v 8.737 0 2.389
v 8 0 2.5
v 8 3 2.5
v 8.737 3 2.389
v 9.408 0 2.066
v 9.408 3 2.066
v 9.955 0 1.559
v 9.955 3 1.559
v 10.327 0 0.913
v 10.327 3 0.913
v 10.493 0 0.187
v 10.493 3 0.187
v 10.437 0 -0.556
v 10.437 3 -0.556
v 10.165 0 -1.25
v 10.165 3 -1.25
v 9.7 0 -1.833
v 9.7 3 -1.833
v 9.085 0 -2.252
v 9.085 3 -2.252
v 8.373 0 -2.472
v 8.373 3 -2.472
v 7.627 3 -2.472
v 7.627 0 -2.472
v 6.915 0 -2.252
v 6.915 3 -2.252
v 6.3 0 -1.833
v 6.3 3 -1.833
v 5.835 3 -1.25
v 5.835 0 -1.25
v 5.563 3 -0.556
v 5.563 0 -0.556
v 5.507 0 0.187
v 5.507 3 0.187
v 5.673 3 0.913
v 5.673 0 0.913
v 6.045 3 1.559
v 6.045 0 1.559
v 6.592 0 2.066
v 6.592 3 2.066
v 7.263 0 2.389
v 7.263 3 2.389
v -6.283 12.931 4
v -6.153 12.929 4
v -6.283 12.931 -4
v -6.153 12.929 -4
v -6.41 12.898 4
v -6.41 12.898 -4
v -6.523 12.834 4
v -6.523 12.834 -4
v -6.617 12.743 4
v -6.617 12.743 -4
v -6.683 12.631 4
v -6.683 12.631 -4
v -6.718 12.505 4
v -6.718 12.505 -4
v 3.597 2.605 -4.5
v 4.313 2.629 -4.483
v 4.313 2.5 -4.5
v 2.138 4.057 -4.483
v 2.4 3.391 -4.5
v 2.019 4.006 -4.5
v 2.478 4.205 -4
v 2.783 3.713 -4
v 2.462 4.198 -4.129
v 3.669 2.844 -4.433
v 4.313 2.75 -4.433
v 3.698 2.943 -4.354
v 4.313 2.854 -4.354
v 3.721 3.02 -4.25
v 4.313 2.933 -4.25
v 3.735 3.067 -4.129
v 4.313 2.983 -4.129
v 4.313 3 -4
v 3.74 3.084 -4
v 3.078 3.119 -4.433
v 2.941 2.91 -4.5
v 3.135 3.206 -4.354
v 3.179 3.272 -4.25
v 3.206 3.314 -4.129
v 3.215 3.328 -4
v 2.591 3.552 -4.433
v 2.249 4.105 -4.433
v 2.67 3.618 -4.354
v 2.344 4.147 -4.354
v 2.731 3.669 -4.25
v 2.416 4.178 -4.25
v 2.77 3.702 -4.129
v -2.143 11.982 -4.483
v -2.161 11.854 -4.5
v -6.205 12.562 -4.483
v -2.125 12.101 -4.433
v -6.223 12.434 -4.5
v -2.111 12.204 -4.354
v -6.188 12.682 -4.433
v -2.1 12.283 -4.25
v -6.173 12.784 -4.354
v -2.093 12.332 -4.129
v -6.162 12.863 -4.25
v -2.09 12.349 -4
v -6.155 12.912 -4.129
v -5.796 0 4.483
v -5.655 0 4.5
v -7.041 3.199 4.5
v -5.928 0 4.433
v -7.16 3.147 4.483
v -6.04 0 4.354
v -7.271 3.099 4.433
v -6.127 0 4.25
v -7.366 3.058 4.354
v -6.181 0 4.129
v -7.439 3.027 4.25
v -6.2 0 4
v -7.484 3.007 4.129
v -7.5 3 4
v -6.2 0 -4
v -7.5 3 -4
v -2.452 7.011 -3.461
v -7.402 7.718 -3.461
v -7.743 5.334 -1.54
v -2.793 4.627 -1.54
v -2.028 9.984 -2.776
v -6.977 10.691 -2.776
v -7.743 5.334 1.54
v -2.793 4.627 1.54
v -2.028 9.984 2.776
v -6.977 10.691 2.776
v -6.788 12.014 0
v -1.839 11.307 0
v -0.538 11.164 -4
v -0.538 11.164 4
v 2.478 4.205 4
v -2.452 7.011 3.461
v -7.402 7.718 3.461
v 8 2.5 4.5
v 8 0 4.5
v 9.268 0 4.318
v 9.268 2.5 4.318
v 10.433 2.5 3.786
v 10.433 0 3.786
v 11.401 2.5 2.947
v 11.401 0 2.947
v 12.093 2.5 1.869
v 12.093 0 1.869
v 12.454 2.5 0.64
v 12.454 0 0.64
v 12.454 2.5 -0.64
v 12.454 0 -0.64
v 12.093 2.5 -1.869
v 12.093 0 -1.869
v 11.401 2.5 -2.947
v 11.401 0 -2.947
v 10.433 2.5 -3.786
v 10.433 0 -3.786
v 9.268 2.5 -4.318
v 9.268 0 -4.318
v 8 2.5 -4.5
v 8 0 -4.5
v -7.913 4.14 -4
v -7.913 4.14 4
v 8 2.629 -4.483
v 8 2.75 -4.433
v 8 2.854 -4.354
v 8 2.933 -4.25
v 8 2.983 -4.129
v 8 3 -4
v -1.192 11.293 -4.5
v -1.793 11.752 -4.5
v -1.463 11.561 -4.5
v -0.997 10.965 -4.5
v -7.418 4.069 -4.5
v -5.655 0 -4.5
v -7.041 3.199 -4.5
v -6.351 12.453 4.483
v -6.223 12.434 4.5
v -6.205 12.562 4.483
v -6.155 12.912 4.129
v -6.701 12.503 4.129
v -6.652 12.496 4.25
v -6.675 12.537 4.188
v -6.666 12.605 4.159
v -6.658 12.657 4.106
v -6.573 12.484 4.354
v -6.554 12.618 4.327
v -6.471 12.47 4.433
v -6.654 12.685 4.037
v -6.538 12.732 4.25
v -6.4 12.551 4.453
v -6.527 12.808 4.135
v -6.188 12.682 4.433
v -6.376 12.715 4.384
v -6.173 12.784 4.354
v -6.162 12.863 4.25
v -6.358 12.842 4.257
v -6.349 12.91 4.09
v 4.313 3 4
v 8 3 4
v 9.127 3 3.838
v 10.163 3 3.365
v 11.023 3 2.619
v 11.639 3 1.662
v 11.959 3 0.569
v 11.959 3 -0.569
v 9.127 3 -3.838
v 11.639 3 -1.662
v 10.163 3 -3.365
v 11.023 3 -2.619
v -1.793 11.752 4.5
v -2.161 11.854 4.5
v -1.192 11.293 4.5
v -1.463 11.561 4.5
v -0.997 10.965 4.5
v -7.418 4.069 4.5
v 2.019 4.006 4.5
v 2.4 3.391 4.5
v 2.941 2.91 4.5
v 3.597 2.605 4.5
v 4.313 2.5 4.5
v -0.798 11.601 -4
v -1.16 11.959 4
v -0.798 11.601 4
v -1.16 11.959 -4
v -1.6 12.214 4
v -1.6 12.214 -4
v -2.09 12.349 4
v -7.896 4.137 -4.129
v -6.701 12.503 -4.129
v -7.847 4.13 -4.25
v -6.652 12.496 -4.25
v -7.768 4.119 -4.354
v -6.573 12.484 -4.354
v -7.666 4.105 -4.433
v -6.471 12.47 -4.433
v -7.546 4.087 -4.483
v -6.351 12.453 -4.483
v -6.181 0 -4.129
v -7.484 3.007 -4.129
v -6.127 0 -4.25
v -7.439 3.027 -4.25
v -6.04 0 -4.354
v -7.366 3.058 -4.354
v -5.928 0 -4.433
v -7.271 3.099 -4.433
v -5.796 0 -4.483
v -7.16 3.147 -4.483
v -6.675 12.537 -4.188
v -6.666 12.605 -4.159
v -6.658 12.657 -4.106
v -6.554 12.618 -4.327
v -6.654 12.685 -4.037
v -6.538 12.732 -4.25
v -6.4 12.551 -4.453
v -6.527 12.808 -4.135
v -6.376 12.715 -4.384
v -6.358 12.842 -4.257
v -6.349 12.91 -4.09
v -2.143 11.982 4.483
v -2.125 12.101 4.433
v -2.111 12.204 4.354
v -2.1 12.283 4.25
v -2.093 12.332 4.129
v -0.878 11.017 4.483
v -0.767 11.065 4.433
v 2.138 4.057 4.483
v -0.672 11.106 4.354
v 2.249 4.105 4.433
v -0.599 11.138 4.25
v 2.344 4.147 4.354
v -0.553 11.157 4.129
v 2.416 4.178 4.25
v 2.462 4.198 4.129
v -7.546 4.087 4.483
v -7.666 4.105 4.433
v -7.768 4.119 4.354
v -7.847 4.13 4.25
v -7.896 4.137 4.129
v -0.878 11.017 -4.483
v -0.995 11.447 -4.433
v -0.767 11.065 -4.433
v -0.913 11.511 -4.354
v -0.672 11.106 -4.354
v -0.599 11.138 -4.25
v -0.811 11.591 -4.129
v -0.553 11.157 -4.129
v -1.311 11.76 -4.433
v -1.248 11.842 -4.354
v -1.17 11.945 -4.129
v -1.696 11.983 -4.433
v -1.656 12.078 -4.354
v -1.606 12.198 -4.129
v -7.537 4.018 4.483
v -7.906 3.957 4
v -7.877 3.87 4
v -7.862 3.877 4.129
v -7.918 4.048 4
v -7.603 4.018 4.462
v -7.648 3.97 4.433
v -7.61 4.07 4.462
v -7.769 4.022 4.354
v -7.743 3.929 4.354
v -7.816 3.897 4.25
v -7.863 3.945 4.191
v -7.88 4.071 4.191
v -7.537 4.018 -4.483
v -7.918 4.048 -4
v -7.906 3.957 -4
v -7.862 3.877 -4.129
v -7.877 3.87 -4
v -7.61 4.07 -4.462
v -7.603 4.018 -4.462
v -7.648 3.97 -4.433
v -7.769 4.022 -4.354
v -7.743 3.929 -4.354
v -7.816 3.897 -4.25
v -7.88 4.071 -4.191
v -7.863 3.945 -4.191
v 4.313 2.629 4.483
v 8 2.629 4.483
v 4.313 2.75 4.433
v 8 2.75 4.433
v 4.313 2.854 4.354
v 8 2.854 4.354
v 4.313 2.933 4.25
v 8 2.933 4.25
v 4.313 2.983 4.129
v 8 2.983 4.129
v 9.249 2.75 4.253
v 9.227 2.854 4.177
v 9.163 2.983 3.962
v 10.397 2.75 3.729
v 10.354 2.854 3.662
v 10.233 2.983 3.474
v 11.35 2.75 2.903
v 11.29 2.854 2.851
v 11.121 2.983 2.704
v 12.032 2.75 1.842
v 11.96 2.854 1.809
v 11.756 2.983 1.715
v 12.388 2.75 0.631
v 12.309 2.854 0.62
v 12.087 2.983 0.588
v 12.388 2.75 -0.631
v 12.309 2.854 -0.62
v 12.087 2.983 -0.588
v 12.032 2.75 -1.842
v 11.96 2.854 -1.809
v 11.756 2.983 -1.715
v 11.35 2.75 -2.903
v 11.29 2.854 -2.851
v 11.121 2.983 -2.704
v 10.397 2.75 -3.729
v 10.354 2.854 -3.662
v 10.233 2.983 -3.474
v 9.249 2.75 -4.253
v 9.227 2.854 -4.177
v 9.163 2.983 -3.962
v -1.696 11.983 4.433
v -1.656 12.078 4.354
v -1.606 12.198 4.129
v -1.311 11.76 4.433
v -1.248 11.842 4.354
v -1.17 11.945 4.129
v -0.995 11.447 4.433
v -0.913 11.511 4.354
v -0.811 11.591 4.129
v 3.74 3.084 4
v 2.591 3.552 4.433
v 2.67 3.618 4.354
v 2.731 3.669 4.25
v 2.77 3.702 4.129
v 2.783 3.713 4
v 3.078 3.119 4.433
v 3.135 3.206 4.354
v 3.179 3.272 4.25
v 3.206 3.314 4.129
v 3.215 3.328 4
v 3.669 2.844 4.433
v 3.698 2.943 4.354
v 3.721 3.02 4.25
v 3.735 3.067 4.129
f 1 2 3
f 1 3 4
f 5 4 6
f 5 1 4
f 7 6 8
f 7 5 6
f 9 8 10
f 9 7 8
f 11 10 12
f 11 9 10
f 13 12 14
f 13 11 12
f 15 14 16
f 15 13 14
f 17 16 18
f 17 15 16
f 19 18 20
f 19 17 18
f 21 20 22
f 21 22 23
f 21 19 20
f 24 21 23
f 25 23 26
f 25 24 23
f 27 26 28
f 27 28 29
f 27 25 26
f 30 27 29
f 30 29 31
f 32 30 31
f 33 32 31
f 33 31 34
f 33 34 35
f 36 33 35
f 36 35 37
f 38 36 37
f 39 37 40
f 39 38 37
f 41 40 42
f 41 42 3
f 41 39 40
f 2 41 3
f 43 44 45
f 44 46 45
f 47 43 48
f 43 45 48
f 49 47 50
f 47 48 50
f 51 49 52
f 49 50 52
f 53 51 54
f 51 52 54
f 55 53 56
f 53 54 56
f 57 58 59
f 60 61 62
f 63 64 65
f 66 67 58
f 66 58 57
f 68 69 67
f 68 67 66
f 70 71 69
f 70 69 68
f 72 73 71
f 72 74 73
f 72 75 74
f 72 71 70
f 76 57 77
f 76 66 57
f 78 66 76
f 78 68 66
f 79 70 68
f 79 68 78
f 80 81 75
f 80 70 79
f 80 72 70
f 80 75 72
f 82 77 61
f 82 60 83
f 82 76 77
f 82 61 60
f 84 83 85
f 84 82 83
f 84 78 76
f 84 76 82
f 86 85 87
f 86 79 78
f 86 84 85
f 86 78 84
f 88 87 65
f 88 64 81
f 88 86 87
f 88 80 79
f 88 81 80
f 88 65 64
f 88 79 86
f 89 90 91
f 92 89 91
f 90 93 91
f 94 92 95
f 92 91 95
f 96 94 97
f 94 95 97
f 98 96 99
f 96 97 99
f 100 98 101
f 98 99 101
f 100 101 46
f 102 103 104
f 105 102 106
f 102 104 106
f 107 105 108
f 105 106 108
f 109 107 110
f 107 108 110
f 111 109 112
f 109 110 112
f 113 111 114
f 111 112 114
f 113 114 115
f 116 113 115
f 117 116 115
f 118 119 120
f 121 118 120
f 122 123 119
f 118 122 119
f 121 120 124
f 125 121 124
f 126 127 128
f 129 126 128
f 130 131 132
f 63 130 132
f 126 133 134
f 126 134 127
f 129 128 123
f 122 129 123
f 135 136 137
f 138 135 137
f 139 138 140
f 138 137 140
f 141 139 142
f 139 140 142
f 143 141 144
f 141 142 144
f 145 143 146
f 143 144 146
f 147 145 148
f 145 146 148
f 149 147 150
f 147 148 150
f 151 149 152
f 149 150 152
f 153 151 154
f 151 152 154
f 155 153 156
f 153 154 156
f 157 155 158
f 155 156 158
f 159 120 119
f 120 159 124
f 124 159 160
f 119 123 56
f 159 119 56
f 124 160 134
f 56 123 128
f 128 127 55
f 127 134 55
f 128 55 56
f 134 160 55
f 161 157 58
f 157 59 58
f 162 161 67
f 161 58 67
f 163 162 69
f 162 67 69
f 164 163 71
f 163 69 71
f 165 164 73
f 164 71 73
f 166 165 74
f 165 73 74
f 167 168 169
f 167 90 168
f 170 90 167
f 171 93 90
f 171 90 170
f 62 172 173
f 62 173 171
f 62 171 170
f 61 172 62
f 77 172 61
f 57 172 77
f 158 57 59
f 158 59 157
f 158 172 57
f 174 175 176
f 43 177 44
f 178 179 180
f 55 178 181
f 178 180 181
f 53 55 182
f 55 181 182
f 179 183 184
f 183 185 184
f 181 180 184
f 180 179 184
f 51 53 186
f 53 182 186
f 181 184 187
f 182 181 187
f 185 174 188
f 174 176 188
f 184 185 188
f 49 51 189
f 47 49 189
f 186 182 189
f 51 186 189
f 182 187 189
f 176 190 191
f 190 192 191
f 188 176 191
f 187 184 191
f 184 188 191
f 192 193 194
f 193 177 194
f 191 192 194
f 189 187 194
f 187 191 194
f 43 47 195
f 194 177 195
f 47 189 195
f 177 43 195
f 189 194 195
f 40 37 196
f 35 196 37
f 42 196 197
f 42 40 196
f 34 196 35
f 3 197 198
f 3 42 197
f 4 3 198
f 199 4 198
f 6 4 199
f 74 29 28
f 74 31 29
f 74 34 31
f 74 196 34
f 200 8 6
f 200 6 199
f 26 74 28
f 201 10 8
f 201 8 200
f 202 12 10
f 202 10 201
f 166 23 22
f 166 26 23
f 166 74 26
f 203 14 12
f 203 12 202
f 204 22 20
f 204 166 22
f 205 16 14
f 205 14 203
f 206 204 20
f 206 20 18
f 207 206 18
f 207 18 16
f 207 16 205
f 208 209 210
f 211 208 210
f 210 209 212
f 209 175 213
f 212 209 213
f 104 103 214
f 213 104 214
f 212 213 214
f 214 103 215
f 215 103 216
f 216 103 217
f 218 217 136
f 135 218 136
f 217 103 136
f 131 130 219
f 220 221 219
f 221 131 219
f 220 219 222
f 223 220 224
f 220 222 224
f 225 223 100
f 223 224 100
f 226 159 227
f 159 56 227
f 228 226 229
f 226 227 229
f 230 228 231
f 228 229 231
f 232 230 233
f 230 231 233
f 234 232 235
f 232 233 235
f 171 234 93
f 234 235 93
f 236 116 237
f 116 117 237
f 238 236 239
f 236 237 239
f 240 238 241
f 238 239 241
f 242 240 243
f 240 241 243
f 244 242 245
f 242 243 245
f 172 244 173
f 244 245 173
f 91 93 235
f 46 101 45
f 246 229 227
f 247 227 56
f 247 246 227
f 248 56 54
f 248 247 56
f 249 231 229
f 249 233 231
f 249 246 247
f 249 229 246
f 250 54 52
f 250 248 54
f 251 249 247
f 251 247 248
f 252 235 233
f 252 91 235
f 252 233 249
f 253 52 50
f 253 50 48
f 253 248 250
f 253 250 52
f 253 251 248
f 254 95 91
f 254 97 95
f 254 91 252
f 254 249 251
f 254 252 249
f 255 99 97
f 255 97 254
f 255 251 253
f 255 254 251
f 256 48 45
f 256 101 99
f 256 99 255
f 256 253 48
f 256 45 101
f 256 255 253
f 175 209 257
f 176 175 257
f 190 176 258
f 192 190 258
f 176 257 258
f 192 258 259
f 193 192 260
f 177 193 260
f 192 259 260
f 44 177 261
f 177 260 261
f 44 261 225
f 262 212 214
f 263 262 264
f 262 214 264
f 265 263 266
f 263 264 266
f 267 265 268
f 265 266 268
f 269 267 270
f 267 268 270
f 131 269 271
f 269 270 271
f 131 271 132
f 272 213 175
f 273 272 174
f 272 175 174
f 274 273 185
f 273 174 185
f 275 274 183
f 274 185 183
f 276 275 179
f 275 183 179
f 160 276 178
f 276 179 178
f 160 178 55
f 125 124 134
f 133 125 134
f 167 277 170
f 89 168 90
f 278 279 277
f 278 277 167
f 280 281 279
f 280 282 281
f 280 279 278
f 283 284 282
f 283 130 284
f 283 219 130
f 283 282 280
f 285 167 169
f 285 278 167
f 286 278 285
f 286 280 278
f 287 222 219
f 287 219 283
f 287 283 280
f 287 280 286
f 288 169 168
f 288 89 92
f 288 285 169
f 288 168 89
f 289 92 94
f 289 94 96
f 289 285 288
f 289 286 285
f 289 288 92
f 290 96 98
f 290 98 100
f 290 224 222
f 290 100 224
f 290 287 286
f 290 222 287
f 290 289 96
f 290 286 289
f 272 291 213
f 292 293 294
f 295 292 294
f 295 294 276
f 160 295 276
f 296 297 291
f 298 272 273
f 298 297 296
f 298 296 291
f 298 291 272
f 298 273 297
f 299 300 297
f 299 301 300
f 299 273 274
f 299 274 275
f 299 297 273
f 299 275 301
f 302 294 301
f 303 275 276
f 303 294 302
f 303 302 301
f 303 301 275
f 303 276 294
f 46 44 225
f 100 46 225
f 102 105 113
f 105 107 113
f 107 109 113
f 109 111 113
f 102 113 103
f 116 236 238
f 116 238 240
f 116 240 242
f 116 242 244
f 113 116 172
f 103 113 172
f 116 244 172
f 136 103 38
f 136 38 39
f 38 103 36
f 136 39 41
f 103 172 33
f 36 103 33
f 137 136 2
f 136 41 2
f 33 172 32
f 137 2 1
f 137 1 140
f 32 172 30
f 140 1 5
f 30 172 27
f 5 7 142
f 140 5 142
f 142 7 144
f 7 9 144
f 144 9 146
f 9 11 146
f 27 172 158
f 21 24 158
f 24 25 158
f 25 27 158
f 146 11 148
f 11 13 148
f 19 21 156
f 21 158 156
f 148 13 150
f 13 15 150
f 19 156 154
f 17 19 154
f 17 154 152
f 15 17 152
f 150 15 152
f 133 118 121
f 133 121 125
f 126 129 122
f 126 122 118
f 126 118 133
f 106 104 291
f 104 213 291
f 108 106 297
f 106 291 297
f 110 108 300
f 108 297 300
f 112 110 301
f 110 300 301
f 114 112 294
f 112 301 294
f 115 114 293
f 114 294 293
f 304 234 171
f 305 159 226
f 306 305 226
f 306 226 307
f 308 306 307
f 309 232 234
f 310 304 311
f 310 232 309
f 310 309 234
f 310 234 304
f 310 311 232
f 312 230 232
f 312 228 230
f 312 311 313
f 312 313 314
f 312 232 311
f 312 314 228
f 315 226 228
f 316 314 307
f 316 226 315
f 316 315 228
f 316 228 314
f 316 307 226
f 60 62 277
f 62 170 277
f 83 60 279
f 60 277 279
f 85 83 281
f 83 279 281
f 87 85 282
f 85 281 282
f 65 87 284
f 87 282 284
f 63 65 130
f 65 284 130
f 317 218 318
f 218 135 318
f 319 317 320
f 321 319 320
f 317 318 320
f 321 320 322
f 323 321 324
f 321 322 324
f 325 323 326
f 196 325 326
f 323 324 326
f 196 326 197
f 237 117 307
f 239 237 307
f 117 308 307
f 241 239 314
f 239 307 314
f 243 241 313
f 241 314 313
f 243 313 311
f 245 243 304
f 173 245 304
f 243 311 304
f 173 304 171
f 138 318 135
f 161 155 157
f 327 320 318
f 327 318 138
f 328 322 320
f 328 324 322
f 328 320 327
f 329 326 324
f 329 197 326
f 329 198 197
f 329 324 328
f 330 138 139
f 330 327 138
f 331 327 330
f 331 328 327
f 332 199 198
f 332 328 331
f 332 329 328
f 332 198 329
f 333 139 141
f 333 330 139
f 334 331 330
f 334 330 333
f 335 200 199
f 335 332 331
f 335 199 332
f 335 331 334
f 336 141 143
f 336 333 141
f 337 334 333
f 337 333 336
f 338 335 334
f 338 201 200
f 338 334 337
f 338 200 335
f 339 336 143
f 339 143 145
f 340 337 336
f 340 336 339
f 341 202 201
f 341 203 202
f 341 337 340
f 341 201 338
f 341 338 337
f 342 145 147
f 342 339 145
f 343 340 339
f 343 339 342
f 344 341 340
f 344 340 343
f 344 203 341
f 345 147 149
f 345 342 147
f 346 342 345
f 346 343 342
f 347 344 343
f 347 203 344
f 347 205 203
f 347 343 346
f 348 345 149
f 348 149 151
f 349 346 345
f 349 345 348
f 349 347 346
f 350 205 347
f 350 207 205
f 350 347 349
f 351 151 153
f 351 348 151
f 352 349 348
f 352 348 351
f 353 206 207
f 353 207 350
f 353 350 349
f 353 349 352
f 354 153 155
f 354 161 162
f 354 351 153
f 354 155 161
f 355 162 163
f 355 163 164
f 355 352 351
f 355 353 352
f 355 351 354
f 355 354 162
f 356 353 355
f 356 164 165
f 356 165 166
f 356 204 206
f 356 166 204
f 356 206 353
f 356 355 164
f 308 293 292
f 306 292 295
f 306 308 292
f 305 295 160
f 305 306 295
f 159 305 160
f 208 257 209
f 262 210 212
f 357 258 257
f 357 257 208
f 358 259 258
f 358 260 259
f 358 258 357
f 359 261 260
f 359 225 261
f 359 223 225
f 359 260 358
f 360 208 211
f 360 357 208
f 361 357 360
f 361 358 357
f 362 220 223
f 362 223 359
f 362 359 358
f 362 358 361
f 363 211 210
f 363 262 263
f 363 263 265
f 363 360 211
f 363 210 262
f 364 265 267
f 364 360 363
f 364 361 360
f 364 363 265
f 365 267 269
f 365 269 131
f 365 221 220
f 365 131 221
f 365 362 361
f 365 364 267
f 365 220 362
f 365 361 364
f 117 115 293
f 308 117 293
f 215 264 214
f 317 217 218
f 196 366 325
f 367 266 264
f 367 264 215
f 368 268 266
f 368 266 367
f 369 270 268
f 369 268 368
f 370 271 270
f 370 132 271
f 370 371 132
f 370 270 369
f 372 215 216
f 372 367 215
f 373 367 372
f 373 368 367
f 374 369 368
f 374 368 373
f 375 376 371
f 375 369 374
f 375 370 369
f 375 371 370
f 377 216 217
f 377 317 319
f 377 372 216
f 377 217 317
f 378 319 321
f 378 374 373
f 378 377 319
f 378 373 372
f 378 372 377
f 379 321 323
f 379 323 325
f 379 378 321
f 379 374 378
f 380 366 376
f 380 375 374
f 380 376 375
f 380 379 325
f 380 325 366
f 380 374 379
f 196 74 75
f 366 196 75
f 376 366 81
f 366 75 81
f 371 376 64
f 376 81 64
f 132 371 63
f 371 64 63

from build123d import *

# Parameters (mm, degrees)
SKETCH1_R           = 2.5
BOSS_EXTRUDE1_DEPTH = 3
SKETCH2_W           = 12.5
SKETCH2_H           = 9
BOSS_EXTRUDE2_DEPTH = 10
SKETCH3_W           = 2
SKETCH3_H           = 3
CUT_EXTRUDE1_DEPTH  = 9
CUT_EXTRUDE2_DEPTH  = 5
FILLET1_R           = 2
FILLET2_R           = 0.5


with BuildPart() as part:
    # Sketch1 → Boss-Extrude1 (new body)
    with BuildSketch(Plane(origin=(0, 0, 0), x_dir=(1, 0, 0), z_dir=(0, 1, 0))):
        with BuildLine():
            Line((-7.5, -4.5), (8, -4.5))
            ThreePointArc((8, -4.5), (12.5, 0), (8, 4.5))
            Line((8, 4.5), (-7.5, 4.5))
            Line((-7.5, 4.5), (-7.5, -4.5))
        make_face()
        with Locations(Location((8, 0, 0), (0, 0, 270))):
            Circle(SKETCH1_R, mode=Mode.SUBTRACT)
    extrude(amount=BOSS_EXTRUDE1_DEPTH)

    # Sketch2 → Boss-Extrude2 (add)
    with BuildSketch(Plane(origin=(0, 3, 0), x_dir=(1, 0, 0), z_dir=(0, 1, 0))):
        with Locations((-3.25, 0)):
            Rectangle(SKETCH2_W, SKETCH2_H)
    extrude(amount=BOSS_EXTRUDE2_DEPTH)

    # Sketch3 → Cut-Extrude1 (cut)
    with BuildSketch(Plane.XY.offset(4.5)):
        Polygon((-9.5, 3), (-7.5, 3), (-7.933333333, 4), (-7.933333333, 13), (-9.5, 13), align=None)
        Polygon((-7.933333333, 13), (-7.933333333, 4), (-6.647619425, 13), align=None)
        Polygon((-7.5, 0), (-6.2, 0), (-7.5, 3), align=None)
        with Locations((-8.5, 1.5)):
            Rectangle(SKETCH3_W, SKETCH3_H)
        Polygon((3, 13), (-6.647619425, 13), (-0.982644513, 12.190718107), (3, 3), align=None)
    extrude(amount=-CUT_EXTRUDE1_DEPTH, mode=Mode.SUBTRACT)

    # Sketch5 → Cut-Extrude2 (cut)
    with BuildSketch(Plane(origin=(-8.3346666, 1.190666308, 0), x_dir=(0, 0, 1), z_dir=(-0.9899494994718544, 0.14142131556248963, 0))):
        Polygon((0, 10.933541985), (-2.775501763, 9.596930781), (-3.460994088, 6.593592669), (-1.540287274, 4.185102504), (1.540287274, 4.185102504), (3.460994088, 6.593592669), (2.775501763, 9.596930781), align=None)
    extrude(amount=-CUT_EXTRUDE2_DEPTH, mode=Mode.SUBTRACT)

    # Fillet1
    fillet1_edges = [part.edges().sort_by_distance(p)[0] for p in [
        (3, 3, 0),
        (-0.982644513, 12.190718107, 0),
    ]]
    fillet(fillet1_edges, radius=FILLET1_R)

    # Fillet2
    fillet2_edges = [part.edges().sort_by_distance(p)[0] for p in [
        (6.156518848, 3, 4.5),
        (-1.159565612, 11.958901825, 4.5),
        (-1.159565612, 11.958901825, -4.5),
        (3.215410654, 3.328110388, -4.5),
        (3.215410654, 3.328110388, 4.5),
        (12.5, 3, 0),
        (6.156518848, 3, -4.5),
        (-7.066666667, 2, -4.5),
        (-7.933333333, 4, 0),
        (-7.066666667, 2, 4.5),
        (-7.290476379, 8.5, 4.5),
        (-7.290476379, 8.5, -4.5),
        (-6.647619425, 13, 0),
        (-4.368863316, 12.674463509, -4.5),
        (-4.368863316, 12.674463509, 4.5),
        (0.970043929, 7.684514009, 4.5),
        (0.970043929, 7.684514009, -4.5),
    ]]
    fillet(fillet2_edges, radius=FILLET2_R)


solid = part.part
